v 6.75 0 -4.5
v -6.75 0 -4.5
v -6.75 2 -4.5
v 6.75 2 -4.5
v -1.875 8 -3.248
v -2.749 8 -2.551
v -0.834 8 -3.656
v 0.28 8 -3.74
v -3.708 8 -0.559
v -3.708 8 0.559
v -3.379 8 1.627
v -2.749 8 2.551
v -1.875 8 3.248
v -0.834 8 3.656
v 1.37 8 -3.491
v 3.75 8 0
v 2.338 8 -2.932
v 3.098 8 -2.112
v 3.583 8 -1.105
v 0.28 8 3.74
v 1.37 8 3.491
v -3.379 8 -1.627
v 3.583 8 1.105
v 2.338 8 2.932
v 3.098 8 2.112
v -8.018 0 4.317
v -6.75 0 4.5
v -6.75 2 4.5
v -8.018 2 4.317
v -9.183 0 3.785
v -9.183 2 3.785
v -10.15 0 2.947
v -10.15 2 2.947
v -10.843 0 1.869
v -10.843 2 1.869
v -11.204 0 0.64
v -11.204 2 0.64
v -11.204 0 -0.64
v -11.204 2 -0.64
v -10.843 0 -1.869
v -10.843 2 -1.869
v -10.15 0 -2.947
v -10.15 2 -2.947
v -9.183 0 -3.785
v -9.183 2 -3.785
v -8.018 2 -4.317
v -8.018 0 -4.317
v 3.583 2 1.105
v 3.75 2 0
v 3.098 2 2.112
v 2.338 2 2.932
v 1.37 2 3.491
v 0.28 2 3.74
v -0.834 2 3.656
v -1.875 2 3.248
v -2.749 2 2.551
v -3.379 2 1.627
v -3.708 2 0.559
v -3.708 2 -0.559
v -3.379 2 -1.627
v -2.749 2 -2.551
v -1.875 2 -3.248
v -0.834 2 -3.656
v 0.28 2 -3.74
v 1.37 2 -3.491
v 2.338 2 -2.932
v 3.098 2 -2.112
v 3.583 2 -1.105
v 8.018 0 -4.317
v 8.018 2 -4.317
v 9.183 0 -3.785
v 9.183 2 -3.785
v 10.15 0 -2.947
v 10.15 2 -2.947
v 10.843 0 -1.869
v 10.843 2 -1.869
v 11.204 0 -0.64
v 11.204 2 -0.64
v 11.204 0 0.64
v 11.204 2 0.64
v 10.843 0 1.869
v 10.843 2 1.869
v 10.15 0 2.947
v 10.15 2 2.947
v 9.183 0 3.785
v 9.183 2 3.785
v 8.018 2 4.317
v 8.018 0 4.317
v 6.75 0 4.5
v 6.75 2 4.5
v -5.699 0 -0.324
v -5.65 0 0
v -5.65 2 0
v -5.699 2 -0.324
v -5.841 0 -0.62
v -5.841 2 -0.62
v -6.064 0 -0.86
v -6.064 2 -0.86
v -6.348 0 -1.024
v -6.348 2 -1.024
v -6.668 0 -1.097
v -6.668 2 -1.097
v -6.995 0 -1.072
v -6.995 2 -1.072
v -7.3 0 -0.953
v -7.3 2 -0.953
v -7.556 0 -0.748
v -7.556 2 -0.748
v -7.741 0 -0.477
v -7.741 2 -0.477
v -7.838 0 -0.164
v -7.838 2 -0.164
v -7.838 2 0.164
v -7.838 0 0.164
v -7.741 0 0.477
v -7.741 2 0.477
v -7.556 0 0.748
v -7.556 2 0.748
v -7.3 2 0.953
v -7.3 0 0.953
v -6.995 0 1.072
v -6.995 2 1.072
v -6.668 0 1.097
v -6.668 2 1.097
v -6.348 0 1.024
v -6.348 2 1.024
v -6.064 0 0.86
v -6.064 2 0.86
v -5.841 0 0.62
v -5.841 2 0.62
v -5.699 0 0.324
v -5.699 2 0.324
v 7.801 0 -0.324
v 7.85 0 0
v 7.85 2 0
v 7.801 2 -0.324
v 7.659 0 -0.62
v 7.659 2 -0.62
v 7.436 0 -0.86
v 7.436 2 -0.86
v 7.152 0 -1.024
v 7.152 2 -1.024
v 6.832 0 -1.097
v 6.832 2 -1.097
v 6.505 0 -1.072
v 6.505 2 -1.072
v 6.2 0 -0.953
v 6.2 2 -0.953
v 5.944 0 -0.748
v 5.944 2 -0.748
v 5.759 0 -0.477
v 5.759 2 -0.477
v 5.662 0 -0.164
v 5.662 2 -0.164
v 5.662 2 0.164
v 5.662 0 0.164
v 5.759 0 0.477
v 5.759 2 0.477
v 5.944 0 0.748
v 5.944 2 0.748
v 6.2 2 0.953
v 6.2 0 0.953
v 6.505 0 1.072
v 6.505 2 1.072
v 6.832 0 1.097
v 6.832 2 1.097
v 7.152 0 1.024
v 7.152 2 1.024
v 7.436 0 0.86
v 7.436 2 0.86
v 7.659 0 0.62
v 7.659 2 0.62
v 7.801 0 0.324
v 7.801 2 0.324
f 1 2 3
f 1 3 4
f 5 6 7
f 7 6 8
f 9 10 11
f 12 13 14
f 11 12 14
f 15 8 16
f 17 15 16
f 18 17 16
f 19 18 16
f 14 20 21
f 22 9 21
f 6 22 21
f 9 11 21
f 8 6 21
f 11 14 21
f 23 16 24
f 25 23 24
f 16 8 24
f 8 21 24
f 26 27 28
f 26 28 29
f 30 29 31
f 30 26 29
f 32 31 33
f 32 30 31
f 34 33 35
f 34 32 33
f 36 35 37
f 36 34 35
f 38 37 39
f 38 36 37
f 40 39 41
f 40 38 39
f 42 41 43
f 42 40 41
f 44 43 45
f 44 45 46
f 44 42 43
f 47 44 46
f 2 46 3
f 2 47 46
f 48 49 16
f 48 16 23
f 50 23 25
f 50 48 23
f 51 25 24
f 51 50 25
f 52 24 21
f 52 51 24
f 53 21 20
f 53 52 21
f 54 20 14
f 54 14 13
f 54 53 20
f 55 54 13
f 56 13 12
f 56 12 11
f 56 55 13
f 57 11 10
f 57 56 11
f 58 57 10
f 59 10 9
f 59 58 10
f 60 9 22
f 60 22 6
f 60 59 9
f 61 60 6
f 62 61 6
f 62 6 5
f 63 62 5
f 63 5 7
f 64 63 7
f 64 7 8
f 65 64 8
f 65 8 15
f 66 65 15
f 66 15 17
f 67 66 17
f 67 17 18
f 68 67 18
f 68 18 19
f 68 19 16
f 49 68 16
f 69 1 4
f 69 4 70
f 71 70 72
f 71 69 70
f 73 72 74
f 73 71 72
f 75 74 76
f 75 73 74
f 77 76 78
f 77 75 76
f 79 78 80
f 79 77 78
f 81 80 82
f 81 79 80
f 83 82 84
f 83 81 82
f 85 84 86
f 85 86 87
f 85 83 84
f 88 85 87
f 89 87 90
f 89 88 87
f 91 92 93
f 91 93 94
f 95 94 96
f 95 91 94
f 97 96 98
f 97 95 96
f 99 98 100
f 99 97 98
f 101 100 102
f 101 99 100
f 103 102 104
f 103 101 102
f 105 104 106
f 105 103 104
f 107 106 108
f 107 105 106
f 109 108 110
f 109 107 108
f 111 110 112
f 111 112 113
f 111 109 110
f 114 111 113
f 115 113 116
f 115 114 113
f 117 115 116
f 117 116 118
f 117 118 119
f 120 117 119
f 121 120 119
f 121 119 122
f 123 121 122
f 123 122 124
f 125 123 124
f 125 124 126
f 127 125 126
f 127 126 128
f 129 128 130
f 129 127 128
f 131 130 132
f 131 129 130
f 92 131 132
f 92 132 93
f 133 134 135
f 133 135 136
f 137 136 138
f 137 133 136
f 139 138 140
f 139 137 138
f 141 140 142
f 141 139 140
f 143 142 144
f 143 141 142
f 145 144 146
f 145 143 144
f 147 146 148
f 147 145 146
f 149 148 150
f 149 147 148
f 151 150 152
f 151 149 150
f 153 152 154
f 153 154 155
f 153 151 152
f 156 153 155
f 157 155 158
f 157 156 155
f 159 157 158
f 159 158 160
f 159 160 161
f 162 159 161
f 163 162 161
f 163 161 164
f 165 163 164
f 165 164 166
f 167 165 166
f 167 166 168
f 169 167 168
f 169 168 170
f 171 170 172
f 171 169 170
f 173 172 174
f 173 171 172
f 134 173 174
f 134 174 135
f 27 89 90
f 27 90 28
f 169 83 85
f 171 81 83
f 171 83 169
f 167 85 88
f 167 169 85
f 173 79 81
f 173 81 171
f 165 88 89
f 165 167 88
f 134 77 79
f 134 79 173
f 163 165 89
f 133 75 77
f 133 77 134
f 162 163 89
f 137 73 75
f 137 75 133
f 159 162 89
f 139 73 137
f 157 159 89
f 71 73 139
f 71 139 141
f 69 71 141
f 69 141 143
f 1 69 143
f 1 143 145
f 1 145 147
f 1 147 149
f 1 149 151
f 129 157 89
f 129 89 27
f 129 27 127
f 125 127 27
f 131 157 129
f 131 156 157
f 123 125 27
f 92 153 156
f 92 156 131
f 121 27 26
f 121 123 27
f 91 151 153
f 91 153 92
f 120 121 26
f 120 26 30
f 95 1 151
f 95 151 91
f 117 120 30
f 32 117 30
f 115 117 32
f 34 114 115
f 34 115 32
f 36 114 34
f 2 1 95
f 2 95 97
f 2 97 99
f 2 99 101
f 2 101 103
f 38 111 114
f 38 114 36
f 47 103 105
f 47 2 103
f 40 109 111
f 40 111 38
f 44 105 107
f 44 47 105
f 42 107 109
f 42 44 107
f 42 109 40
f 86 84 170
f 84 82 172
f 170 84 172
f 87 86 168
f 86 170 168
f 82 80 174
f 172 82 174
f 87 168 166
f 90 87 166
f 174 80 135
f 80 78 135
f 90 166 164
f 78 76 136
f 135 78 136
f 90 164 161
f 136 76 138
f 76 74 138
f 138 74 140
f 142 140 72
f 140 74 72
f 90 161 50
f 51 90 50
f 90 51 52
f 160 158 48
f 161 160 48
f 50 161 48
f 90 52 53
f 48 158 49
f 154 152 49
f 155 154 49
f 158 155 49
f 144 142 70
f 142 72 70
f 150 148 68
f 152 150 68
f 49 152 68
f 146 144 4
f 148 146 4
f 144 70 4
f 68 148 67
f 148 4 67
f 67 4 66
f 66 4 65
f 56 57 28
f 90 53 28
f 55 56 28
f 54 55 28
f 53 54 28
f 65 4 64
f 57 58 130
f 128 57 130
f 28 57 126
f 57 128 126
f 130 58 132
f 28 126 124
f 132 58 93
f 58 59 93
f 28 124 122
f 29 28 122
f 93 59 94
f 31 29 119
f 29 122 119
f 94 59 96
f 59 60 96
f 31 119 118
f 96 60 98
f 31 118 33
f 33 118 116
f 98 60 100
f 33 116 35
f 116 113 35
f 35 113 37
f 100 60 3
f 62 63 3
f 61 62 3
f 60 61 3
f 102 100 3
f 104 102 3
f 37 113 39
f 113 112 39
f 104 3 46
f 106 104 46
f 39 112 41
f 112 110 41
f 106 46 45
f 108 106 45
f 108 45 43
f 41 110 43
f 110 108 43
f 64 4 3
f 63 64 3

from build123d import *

# Parameters (mm, degrees)
SKETCH1_R           = 1.1
SKETCH1_R_2         = 3.75
BOSS_EXTRUDE3_DEPTH = 2
SKETCH3_R           = 3.75
BOSS_EXTRUDE4_DEPTH = 8


with BuildPart() as part:
    # Sketch1 → Boss-Extrude3 (new body)
    with BuildSketch(Plane(origin=(0, 0, 0), x_dir=(1, 0, 0), z_dir=(0, 1, 0))):
        with BuildLine():
            Line((-6.75, 4.499502967), (6.75, 4.499502967))
            ThreePointArc((6.75, 4.499502967), (11.249502967, 0), (6.75, -4.499502967))
            Line((6.75, -4.499502967), (-6.75, -4.499502967))
            ThreePointArc((-6.75, -4.499502967), (-11.249502967, 0), (-6.75, 4.499502967))
        make_face()
        with Locations((-6.75, 0)):
            Circle(SKETCH1_R, mode=Mode.SUBTRACT)
        with Locations((6.75, 0)):
            Circle(SKETCH1_R, mode=Mode.SUBTRACT)
        Circle(SKETCH1_R_2, mode=Mode.SUBTRACT)
    extrude(amount=BOSS_EXTRUDE3_DEPTH)

    # Sketch3 → Boss-Extrude4 (add)
    with BuildSketch(Plane.XZ):
        Circle(SKETCH3_R)
    extrude(amount=-BOSS_EXTRUDE4_DEPTH)


solid = part.part
